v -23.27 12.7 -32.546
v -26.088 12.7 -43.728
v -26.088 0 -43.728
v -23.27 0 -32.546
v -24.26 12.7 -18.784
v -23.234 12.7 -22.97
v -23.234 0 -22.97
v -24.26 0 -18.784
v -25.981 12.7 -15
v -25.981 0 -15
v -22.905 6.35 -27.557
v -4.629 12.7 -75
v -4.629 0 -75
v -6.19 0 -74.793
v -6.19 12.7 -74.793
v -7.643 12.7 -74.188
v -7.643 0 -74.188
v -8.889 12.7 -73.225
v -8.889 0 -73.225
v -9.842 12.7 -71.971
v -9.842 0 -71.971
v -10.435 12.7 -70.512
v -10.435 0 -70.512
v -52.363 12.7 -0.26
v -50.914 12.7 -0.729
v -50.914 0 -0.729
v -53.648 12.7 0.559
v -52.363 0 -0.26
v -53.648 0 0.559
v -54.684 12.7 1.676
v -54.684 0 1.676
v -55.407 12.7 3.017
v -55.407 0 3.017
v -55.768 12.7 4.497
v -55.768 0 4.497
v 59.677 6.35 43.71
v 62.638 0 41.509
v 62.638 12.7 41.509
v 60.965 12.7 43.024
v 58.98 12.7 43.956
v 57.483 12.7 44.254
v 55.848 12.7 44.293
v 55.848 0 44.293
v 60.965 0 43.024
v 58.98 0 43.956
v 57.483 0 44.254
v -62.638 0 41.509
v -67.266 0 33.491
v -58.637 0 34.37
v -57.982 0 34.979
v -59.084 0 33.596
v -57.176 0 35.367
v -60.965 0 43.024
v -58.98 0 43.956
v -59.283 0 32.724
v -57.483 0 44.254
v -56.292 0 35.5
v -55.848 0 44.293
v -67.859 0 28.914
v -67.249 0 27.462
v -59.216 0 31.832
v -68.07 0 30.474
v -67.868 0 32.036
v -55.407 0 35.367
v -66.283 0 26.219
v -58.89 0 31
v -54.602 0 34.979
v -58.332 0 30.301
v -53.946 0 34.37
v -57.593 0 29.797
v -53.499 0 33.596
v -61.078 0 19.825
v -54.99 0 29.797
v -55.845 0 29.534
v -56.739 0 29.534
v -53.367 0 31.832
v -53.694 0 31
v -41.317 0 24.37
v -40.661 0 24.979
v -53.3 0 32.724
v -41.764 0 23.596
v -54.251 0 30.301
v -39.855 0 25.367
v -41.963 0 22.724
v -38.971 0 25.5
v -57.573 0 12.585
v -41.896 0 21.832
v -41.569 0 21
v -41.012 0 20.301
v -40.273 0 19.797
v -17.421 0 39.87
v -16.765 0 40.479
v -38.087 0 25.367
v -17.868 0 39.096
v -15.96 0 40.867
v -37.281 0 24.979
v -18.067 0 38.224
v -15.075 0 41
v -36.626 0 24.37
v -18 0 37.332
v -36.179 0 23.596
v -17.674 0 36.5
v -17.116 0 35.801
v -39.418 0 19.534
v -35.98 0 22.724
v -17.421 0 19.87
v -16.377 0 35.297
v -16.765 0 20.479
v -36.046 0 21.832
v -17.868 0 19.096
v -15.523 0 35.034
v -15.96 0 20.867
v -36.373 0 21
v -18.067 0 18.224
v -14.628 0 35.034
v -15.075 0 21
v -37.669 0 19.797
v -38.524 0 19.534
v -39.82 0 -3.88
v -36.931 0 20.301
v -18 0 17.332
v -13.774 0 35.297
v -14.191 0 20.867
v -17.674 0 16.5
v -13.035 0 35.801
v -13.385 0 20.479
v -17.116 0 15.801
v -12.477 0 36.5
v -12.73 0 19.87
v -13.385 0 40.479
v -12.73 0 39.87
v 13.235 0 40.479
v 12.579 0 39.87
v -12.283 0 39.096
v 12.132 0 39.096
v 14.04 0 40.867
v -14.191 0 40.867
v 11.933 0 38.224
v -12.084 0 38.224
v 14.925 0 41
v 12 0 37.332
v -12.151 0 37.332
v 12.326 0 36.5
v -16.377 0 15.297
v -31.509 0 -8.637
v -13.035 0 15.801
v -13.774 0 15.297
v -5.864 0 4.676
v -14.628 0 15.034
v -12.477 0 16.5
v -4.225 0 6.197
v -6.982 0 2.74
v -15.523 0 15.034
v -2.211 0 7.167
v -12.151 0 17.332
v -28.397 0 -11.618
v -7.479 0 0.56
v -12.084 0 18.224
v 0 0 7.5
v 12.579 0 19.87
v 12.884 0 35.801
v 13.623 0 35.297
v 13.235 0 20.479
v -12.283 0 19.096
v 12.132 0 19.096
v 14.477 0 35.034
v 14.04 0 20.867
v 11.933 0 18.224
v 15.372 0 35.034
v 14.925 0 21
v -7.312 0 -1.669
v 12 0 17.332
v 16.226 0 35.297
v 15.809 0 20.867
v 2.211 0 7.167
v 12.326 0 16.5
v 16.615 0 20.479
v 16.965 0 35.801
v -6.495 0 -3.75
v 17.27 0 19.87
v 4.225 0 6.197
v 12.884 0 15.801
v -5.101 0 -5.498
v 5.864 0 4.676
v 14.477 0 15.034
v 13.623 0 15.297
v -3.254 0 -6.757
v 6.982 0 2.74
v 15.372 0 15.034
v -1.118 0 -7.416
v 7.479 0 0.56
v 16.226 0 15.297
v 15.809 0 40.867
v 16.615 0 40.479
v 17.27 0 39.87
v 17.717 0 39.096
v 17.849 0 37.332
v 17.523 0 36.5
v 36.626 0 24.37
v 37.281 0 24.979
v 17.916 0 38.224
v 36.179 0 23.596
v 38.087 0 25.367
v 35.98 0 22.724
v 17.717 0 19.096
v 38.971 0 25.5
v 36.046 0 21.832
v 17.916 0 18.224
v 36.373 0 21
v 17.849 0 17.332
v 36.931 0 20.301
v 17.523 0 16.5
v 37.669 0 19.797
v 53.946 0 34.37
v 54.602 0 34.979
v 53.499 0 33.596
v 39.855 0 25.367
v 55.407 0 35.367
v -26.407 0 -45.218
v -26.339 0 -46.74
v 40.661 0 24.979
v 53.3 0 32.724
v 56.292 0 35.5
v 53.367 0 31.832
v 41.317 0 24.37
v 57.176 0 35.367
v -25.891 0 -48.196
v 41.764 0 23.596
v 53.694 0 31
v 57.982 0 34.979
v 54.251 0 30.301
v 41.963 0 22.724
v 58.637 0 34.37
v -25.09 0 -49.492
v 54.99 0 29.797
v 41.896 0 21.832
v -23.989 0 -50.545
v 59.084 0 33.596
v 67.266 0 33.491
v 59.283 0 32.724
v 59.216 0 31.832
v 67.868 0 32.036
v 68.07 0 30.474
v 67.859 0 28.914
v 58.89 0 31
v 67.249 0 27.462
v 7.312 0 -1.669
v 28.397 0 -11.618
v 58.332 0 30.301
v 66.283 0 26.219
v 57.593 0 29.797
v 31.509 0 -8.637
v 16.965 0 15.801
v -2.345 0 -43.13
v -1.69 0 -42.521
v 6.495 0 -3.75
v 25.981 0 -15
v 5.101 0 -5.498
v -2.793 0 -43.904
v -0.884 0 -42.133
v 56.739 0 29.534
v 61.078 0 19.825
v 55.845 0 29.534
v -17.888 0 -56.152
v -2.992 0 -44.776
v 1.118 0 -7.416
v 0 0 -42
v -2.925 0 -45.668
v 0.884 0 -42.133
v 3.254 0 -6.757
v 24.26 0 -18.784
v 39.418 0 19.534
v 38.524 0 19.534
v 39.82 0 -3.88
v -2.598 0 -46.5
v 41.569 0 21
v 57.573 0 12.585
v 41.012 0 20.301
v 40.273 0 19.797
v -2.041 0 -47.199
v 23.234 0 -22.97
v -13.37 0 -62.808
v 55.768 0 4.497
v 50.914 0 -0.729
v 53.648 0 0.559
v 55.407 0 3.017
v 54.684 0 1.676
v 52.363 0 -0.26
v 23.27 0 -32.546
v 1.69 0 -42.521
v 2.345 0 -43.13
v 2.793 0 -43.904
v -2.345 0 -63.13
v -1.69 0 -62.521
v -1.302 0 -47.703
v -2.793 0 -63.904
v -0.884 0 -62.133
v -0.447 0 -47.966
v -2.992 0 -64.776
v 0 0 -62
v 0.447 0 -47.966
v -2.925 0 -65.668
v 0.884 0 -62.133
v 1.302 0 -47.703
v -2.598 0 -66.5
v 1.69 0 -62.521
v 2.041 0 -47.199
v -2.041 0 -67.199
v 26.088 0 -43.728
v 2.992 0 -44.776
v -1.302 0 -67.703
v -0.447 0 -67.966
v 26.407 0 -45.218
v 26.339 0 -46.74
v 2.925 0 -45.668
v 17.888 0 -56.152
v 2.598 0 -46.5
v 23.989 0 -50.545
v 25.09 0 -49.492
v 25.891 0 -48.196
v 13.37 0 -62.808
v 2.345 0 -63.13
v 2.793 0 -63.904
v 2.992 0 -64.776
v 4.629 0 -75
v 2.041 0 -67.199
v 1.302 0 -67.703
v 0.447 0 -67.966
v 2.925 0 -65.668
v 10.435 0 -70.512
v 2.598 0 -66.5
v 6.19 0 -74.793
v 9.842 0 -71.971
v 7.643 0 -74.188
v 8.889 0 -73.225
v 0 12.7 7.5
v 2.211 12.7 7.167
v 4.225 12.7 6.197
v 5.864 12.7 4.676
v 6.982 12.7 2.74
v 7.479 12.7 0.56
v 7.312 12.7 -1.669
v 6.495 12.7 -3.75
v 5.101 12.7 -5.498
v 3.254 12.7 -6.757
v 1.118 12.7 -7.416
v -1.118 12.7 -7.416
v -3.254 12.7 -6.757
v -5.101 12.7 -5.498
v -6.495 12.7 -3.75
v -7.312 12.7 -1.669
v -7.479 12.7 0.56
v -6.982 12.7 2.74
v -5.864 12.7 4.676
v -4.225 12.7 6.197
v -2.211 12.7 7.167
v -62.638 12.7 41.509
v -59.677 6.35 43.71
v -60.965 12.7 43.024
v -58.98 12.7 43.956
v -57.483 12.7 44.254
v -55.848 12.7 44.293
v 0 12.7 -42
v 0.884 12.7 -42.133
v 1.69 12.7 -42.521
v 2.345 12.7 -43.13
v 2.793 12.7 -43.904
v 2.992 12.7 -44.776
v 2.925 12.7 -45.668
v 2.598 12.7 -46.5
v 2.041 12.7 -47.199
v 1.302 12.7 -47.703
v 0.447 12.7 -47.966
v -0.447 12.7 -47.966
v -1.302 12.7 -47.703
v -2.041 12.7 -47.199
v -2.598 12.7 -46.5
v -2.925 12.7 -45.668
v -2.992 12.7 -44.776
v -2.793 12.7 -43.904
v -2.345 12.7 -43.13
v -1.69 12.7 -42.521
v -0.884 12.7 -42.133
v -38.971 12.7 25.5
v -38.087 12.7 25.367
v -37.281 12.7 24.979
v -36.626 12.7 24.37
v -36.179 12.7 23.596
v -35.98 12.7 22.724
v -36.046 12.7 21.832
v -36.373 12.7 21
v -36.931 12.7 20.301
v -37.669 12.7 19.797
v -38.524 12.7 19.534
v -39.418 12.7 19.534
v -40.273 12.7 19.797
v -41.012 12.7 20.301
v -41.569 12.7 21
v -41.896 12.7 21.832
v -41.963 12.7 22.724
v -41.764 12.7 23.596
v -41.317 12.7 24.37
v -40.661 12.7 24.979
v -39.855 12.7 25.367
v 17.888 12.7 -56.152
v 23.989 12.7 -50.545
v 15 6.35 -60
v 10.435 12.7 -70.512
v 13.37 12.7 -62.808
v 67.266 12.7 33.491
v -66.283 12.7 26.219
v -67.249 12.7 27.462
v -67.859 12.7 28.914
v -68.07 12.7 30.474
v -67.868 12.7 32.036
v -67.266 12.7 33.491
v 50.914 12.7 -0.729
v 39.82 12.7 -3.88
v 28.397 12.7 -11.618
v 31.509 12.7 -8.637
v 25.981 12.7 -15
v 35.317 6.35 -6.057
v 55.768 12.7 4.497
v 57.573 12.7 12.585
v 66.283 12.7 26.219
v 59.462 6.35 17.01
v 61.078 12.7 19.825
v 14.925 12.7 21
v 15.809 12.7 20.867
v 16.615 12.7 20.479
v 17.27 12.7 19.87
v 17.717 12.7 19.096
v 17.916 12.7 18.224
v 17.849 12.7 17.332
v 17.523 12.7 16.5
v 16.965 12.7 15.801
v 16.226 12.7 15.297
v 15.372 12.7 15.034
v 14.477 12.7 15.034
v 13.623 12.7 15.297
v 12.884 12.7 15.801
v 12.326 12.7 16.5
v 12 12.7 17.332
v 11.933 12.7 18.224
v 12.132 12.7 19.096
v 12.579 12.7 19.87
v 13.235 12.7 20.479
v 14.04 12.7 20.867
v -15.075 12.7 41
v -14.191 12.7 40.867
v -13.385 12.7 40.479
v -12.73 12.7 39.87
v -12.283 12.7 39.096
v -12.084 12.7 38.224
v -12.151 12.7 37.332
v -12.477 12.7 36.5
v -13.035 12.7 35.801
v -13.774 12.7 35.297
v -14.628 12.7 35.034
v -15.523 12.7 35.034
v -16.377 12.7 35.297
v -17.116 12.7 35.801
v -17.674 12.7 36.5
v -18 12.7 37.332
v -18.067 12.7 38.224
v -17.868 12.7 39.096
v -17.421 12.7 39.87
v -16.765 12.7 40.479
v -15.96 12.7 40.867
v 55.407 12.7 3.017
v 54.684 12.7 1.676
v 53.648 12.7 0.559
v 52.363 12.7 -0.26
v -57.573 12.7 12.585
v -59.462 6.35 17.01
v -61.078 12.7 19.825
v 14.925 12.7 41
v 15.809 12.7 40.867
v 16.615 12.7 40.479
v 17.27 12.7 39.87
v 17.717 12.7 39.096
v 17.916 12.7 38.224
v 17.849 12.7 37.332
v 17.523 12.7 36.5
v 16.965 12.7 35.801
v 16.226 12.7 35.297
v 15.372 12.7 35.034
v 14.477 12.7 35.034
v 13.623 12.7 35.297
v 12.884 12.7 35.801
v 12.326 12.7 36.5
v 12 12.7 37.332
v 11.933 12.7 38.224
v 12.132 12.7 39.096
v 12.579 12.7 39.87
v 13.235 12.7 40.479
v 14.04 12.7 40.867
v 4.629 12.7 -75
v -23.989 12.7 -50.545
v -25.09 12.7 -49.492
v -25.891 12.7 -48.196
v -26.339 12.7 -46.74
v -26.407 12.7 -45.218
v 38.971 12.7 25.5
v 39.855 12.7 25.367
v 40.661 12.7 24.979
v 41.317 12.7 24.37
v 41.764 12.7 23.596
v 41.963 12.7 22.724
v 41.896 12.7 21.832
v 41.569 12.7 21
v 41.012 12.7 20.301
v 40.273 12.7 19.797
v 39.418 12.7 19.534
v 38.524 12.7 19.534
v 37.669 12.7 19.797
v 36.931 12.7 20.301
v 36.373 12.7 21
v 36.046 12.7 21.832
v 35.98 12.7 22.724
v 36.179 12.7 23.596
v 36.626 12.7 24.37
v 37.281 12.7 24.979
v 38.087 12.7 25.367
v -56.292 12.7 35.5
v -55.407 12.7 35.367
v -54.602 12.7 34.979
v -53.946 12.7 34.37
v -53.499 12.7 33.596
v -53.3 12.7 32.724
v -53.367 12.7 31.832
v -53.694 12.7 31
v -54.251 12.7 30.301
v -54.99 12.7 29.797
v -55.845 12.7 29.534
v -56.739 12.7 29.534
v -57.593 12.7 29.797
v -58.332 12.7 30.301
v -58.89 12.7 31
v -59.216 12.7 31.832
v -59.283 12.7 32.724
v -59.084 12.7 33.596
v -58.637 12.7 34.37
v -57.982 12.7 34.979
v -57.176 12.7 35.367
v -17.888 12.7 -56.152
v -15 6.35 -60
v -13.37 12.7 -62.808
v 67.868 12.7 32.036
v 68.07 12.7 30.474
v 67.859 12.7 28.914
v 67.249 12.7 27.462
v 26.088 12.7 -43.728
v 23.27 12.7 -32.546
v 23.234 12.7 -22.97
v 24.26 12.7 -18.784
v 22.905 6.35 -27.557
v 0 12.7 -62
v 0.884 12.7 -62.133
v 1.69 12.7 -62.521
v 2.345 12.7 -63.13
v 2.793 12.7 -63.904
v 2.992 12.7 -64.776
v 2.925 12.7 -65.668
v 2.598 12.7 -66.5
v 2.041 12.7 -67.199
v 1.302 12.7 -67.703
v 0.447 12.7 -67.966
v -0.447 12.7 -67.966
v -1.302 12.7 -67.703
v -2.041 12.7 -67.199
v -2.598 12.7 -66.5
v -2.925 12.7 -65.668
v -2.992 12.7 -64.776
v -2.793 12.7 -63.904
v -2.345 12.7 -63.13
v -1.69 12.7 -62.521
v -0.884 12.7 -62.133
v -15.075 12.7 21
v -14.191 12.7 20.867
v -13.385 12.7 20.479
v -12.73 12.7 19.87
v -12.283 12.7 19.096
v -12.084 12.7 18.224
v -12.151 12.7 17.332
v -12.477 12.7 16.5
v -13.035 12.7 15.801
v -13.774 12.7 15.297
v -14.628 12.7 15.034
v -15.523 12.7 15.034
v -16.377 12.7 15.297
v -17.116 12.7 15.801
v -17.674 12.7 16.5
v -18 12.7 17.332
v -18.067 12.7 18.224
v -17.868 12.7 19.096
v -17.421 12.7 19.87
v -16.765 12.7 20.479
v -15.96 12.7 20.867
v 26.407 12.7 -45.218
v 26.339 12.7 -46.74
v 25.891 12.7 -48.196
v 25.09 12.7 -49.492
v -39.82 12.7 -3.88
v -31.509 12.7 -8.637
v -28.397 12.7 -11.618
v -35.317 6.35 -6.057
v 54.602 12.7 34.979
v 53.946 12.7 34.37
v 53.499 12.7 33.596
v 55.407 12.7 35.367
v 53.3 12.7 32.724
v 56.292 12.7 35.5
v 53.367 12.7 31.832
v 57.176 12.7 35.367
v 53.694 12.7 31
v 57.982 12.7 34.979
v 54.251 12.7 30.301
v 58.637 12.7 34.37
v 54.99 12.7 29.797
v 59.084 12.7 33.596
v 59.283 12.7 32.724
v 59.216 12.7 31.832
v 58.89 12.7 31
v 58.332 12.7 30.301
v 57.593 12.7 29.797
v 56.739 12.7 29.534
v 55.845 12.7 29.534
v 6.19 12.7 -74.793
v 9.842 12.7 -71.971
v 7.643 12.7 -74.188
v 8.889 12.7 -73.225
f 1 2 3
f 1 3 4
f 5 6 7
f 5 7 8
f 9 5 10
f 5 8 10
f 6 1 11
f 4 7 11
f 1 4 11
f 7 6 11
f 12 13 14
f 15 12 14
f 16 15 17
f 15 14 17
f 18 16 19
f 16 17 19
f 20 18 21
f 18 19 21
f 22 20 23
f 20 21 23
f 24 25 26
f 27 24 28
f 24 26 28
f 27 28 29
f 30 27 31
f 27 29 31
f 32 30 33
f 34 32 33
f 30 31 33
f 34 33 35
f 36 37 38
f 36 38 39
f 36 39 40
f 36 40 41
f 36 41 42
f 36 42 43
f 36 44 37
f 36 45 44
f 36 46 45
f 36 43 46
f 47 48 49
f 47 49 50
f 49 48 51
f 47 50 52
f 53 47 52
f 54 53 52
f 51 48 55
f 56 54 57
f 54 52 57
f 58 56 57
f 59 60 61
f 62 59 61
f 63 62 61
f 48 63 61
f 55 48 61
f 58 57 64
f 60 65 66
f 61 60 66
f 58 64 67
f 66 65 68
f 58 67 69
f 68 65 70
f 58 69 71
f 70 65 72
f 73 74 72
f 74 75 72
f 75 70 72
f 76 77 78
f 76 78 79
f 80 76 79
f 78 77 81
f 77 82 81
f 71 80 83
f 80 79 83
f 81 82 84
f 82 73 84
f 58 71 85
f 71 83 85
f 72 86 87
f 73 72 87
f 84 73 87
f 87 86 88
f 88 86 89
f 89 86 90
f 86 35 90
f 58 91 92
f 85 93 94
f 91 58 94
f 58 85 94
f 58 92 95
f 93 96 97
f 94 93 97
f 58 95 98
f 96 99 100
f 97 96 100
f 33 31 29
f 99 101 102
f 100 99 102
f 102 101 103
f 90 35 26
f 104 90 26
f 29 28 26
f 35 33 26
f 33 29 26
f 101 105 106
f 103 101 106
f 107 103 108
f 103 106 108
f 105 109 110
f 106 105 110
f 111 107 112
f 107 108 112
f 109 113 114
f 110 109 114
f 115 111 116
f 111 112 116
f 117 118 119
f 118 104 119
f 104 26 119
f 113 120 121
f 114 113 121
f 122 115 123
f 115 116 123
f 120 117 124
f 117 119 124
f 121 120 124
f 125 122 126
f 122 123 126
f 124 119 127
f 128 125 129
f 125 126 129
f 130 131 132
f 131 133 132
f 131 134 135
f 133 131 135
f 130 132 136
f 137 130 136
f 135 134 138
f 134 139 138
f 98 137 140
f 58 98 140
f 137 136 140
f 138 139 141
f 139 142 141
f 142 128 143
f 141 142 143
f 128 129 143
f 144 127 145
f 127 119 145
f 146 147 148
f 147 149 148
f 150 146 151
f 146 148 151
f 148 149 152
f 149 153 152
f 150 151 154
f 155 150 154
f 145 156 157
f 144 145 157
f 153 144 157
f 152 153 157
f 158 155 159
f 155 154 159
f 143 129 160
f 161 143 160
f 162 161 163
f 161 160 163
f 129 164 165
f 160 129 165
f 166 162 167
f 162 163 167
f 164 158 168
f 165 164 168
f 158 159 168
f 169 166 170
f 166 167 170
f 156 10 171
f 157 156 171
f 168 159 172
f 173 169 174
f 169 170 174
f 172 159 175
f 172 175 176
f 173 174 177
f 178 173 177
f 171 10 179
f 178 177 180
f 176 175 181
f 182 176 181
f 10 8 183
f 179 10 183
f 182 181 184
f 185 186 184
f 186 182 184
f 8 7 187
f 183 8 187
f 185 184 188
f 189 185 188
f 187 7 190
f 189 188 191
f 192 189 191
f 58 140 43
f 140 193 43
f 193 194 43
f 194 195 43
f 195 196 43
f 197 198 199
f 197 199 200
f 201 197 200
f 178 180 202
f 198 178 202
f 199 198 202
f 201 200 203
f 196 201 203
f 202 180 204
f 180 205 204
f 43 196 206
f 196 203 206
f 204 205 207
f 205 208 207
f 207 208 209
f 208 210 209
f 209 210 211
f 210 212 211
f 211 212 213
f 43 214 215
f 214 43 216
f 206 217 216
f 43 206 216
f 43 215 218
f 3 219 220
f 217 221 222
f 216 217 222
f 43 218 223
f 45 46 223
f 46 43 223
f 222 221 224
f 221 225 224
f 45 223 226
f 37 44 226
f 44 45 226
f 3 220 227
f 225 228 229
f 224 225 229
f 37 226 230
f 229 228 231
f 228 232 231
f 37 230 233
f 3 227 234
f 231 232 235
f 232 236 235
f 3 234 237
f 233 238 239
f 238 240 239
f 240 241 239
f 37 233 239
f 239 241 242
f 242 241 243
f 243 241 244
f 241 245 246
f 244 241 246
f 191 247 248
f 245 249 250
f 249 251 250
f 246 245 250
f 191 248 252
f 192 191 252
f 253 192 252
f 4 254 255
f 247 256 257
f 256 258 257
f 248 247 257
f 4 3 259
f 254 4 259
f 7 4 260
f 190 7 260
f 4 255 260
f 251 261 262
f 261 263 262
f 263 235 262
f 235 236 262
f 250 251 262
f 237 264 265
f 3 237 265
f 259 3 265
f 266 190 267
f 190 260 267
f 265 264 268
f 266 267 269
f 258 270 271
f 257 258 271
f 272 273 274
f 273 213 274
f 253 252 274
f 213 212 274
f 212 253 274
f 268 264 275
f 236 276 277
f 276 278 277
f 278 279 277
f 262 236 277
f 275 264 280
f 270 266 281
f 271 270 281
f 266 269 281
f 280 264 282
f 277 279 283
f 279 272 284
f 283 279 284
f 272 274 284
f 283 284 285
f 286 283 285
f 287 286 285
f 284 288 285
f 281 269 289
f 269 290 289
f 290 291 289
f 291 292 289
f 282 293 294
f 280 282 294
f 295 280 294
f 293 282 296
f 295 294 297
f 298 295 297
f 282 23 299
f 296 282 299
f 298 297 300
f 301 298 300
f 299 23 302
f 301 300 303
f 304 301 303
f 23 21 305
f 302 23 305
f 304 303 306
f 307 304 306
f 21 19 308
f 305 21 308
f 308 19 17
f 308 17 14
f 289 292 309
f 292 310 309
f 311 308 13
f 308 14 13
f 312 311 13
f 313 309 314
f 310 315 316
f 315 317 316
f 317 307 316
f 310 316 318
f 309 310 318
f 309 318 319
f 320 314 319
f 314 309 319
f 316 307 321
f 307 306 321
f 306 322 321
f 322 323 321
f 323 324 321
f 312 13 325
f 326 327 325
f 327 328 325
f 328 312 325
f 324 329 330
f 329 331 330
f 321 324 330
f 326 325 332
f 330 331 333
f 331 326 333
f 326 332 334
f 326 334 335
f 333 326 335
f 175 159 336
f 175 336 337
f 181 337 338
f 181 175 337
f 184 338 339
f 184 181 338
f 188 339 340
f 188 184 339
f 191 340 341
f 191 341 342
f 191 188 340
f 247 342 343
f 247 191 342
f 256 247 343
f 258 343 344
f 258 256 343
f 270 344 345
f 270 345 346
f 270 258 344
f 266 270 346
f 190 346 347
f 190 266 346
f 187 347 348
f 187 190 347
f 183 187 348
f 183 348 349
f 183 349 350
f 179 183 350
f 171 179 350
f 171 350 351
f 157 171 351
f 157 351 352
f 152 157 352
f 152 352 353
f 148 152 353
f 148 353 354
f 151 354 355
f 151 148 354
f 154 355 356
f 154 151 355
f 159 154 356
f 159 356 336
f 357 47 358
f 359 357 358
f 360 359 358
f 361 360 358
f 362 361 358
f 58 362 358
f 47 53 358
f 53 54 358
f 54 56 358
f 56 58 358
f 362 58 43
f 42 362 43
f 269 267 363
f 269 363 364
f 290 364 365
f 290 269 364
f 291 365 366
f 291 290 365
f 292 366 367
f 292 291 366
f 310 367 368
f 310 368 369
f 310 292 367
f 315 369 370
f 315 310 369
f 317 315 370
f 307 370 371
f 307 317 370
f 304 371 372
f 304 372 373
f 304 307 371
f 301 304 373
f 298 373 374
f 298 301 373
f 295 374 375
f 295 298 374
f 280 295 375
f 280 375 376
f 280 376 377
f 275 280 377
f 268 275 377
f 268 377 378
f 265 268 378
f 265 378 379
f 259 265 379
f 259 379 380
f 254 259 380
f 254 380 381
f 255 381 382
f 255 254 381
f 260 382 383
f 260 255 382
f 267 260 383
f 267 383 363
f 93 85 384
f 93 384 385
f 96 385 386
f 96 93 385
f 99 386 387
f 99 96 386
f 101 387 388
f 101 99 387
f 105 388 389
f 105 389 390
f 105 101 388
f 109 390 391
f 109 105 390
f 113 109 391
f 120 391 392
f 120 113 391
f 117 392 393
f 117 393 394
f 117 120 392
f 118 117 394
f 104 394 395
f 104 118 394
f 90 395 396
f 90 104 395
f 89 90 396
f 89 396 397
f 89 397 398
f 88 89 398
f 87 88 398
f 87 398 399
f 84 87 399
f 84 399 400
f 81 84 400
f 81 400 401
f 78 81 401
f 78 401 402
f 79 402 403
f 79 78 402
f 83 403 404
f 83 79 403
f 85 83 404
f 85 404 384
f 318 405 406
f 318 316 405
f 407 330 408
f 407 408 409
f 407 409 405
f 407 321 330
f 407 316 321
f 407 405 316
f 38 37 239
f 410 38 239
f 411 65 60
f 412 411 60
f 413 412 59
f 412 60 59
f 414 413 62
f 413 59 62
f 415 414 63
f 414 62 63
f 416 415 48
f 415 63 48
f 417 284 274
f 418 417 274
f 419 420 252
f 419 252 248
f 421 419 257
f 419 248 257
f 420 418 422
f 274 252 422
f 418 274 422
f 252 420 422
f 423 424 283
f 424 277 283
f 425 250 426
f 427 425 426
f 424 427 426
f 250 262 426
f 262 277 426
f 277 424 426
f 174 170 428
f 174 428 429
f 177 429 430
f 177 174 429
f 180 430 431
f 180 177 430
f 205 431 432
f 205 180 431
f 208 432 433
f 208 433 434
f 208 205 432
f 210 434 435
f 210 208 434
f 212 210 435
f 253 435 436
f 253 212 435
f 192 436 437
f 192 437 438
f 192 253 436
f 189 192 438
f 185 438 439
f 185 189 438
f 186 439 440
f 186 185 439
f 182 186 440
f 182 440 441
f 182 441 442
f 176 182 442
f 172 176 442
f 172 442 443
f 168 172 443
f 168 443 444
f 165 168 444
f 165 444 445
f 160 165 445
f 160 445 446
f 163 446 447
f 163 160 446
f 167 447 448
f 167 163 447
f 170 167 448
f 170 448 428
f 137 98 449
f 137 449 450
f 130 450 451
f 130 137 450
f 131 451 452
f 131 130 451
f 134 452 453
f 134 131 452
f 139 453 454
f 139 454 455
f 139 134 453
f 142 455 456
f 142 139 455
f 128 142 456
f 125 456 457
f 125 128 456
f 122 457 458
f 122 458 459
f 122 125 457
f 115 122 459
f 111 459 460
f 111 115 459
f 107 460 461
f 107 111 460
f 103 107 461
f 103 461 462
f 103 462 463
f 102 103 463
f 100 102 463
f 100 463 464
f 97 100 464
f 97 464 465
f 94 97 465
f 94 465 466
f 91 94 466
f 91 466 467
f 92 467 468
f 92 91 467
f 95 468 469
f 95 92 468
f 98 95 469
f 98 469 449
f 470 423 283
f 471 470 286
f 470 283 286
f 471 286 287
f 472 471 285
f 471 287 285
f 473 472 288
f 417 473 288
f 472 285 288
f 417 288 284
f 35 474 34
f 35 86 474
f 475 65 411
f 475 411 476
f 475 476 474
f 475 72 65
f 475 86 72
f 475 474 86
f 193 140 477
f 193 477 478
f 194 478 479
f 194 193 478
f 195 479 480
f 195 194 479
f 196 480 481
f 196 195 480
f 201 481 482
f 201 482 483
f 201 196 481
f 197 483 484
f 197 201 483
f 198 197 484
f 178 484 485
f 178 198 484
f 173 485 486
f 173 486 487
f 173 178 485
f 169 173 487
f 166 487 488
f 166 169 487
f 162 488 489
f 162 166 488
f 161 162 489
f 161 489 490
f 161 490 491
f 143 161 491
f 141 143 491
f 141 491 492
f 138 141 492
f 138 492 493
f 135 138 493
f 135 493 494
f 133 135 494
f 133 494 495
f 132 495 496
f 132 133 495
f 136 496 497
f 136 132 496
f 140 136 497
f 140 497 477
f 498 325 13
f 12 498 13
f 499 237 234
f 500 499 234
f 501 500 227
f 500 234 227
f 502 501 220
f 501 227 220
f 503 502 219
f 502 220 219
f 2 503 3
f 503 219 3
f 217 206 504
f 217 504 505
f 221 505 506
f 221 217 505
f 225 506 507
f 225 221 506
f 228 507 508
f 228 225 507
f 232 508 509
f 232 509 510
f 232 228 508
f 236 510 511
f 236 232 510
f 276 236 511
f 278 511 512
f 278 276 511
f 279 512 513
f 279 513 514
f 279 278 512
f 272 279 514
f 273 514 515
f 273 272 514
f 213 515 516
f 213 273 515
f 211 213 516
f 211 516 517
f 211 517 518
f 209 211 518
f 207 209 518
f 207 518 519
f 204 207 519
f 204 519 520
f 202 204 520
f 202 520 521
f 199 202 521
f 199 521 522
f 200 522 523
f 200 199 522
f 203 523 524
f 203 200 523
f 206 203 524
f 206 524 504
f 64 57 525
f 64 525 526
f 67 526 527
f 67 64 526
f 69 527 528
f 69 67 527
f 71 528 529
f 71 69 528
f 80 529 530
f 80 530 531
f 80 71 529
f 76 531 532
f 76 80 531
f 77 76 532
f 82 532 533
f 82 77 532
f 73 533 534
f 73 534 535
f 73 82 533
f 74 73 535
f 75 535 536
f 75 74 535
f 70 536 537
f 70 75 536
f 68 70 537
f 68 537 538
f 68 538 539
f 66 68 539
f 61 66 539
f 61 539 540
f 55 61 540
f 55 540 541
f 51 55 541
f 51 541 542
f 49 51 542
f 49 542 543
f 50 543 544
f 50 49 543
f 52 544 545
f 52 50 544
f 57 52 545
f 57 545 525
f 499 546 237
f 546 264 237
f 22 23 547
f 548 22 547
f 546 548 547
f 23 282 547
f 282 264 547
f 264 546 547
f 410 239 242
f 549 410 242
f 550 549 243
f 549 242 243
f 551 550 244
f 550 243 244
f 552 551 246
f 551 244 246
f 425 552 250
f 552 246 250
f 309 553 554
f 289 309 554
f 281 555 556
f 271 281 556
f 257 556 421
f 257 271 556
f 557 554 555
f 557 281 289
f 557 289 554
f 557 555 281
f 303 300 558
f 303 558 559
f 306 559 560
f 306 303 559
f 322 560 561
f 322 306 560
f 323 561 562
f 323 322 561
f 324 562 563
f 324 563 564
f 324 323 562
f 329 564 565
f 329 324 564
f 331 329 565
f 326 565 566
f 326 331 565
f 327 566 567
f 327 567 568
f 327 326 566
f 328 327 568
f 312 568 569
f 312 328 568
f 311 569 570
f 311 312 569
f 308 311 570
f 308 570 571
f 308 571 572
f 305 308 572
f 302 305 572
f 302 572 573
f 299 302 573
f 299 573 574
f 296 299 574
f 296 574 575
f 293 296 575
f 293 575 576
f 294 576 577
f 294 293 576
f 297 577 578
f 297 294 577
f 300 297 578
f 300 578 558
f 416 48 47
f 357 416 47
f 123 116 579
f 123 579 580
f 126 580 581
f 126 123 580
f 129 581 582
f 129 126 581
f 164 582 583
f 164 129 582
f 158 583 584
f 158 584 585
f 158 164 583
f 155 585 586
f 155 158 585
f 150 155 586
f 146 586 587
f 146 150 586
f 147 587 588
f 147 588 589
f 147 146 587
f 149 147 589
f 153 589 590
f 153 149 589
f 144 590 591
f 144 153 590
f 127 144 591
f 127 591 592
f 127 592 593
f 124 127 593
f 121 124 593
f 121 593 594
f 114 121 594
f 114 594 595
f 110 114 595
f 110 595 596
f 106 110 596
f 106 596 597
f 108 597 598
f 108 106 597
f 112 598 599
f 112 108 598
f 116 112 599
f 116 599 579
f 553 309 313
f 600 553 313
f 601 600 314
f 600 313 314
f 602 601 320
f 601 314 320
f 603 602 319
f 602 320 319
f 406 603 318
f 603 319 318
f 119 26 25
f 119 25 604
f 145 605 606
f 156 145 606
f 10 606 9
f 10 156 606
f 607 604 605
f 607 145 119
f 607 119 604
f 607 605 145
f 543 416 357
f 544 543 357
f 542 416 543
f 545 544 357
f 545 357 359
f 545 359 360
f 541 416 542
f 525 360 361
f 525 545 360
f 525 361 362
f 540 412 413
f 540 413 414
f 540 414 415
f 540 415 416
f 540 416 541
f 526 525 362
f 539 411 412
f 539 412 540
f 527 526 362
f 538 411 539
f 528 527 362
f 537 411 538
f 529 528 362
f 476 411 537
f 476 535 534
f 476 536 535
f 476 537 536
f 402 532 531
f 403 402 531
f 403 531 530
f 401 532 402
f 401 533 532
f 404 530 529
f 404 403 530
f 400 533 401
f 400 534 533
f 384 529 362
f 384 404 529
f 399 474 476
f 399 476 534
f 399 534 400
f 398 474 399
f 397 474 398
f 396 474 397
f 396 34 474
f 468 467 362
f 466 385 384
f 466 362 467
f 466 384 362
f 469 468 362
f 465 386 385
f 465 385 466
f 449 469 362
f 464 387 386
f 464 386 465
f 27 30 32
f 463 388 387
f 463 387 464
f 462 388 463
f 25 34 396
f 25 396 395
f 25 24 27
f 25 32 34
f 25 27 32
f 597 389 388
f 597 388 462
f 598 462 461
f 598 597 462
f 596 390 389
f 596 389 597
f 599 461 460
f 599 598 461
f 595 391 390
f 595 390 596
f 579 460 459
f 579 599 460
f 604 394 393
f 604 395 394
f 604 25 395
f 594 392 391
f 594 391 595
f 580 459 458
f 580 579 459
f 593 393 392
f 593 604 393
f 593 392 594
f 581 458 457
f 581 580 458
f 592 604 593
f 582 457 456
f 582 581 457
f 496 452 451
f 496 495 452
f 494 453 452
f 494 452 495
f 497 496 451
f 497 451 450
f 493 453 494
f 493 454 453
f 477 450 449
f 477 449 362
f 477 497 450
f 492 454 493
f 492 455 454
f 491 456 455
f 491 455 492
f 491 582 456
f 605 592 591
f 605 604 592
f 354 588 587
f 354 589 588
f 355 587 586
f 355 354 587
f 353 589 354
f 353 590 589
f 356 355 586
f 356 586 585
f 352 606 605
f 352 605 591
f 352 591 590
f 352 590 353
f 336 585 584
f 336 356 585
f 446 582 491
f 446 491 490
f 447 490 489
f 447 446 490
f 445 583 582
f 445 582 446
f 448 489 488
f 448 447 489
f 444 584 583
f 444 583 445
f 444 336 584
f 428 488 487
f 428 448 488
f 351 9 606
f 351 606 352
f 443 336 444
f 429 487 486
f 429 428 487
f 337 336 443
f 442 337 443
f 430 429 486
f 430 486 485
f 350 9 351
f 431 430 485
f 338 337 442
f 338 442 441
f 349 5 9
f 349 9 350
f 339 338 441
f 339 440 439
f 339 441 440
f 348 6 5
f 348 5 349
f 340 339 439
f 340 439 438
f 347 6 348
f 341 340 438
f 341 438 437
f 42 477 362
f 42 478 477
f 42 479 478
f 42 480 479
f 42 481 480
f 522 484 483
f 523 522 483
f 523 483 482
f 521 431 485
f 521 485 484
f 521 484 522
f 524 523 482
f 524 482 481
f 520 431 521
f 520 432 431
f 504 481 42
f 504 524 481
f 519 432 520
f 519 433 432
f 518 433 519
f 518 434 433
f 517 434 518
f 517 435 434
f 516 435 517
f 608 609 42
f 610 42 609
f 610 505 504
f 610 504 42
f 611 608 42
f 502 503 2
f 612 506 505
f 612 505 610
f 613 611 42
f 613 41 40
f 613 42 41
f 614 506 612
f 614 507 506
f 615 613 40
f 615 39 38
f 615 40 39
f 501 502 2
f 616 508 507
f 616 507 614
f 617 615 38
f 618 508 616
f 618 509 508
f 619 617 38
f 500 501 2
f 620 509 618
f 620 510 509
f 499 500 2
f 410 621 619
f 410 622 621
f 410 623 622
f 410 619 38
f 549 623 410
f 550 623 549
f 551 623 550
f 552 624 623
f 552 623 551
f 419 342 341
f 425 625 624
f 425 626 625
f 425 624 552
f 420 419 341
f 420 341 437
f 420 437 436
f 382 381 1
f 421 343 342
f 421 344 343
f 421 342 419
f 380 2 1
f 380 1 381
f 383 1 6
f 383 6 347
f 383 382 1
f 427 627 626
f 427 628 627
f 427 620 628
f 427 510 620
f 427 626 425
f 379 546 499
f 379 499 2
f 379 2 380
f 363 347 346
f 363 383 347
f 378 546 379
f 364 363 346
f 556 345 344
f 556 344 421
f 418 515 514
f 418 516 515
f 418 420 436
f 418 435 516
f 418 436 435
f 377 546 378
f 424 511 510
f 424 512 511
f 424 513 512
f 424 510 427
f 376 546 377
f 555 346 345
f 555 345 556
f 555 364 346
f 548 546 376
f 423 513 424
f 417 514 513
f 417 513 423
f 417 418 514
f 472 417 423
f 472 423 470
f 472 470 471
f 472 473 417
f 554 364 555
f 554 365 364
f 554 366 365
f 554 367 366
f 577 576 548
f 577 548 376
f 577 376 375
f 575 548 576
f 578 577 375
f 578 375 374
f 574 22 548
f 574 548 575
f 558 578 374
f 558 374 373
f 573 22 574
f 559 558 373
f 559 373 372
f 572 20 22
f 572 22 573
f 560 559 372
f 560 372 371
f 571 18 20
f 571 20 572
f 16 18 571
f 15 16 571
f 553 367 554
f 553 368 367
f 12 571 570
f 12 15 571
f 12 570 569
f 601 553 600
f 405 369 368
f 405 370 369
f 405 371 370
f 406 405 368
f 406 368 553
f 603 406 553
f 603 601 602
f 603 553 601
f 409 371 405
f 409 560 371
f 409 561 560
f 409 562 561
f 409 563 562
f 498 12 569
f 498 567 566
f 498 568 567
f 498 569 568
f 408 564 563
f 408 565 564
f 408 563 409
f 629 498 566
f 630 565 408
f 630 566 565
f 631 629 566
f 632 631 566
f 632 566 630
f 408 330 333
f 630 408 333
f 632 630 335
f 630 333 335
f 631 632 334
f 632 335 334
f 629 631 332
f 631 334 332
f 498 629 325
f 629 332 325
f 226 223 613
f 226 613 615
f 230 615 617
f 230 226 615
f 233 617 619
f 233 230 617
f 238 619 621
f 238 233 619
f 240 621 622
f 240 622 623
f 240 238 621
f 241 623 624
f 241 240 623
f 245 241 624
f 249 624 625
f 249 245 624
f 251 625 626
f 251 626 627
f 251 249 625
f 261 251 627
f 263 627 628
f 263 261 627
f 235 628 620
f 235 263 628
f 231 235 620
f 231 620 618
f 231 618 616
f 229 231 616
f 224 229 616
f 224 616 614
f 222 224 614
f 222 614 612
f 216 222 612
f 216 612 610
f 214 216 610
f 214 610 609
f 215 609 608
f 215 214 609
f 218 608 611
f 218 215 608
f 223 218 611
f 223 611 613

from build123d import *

# Parameters (mm, degrees)
SKETCH1_R           = 7.5
SKETCH1_R_2         = 3
BOSS_EXTRUDE1_DEPTH = 12.7


with BuildPart() as part:
    # Sketch1 → Boss-Extrude1 (new body)
    with BuildSketch(Plane(origin=(0, 0, 0), x_dir=(1, 0, 0), z_dir=(0, 1, 0))):
        with BuildLine():
            Line((4.628728323, 75), (-4.628728323, 75))
            ThreePointArc((-4.628728323, 75), (-8.298056729, 73.747212766), (-10.435089207, 70.512009682))
            add(Edge.make_bspline(
                [(-10.435089207, 70.512009682), (-11.436889623, 66.664934619), (-14.691827535, 59.170334198), (-20.319154818, 53.251718644), (-23.989109736, 50.544662785)],
                knots=[0.130554933, 0.130554933, 0.130554933, 0.130554933, 0.477565762, 0.872598063, 0.872598063, 0.872598063, 0.872598063], degree=3))
            ThreePointArc((-23.989109736, 50.544662785), (-26.161679176, 47.482134252), (-26.088483789, 43.727965713))
            add(Edge.make_bspline(
                [(-26.088483789, 43.727965713), (-23.983802584, 37.735198712), (-21.861167747, 26.954437426), (-23.911988058, 18.58322157), (-25.980762, 15)],
                knots=[0.052697527, 0.052697527, 0.052697527, 0.052697527, 0.276348764, 0.5, 0.5, 0.5, 0.5], degree=3))
            add(Edge.make_bspline(
                [(-50.913771074, 0.729306865), (-44.671541988, 1.902983), (-34.273811388, 5.455107991), (-28.049535938, 11.416778424), (-25.980762, 15)],
                knots=[0.052697527, 0.052697527, 0.052697527, 0.052697527, 0.276348763, 0.5, 0.5, 0.5, 0.5], degree=3))
            ThreePointArc((-50.913771074, 0.729306865), (-54.201574082, -1.084388344), (-55.767516863, -4.497152931))
            add(Edge.make_bspline(
                [(-66.282736261, -26.218952497), (-63.451971733, -23.427830356), (-58.58892633, -16.861671221), (-56.276918547, -9.028955057), (-55.767516863, -4.497152931)],
                knots=[0.130554933, 0.130554933, 0.130554933, 0.130554933, 0.477565762, 0.872598064, 0.872598064, 0.872598064, 0.872598064], degree=3))
            ThreePointArc((-66.282736261, -26.218952497), (-68.015988078, -29.687278454), (-67.266269445, -33.491403685))
            Line((-67.266269445, -33.491403685), (-62.637541122, -41.508596315))
            add(Edge.make_bspline(
                [(-62.637541122, -41.508596315), (-60.110445807, -44.518882553), (-55.847647053, -44.293057185)],
                knots=[0, 0, 0, 1, 1, 1], degree=2))
            Line((-55.847647053, -44.293057185), (55.847647053, -44.293057185))
            add(Edge.make_bspline(
                [(62.637541122, -41.508596315), (60.110445807, -44.518882553), (55.847647053, -44.293057185)],
                knots=[0, 0, 0, 1, 1, 1], degree=2))
            Line((62.637541122, -41.508596315), (67.266269445, -33.491403685))
            ThreePointArc((67.266269445, -33.491403685), (68.015988078, -29.687278454), (66.282736261, -26.218952497))
            add(Edge.make_bspline(
                [(66.282736261, -26.218952497), (63.451971733, -23.427830356), (58.58892633, -16.861671221), (56.276918547, -9.028955057), (55.767516863, -4.497152931)],
                knots=[0.130554933, 0.130554933, 0.130554933, 0.130554933, 0.477565762, 0.872598064, 0.872598064, 0.872598064, 0.872598064], degree=3))
            ThreePointArc((55.767516863, -4.497152931), (54.201574082, -1.084388344), (50.913771074, 0.729306865))
            add(Edge.make_bspline(
                [(50.913771074, 0.729306865), (44.671541988, 1.902983), (34.273811388, 5.455107991), (28.049535938, 11.416778424), (25.980762, 15)],
                knots=[0.052697527, 0.052697527, 0.052697527, 0.052697527, 0.276348763, 0.5, 0.5, 0.5, 0.5], degree=3))
            add(Edge.make_bspline(
                [(26.088483789, 43.727965713), (23.983802584, 37.735198712), (21.861167747, 26.954437426), (23.911988058, 18.58322157), (25.980762, 15)],
                knots=[0.052697527, 0.052697527, 0.052697527, 0.052697527, 0.276348764, 0.5, 0.5, 0.5, 0.5], degree=3))
            ThreePointArc((26.088483789, 43.727965713), (26.161679176, 47.482134252), (23.989109736, 50.544662785))
            add(Edge.make_bspline(
                [(10.435089207, 70.512009682), (11.436889623, 66.664934619), (14.691827535, 59.170334198), (20.319154818, 53.251718644), (23.989109736, 50.544662785)],
                knots=[0.130554933, 0.130554933, 0.130554933, 0.130554933, 0.477565762, 0.872598063, 0.872598063, 0.872598063, 0.872598063], degree=3))
            ThreePointArc((10.435089207, 70.512009682), (8.298056729, 73.747212766), (4.628728323, 75))
        make_face()
        with Locations(Location((0, 0, 0), (0, 0, 270))):
            Circle(SKETCH1_R, mode=Mode.SUBTRACT)
        with Locations(Location((0, 65, 0), (0, 0, 270))):
            Circle(SKETCH1_R_2, mode=Mode.SUBTRACT)
        with Locations(Location((0, 45, 0), (0, 0, 270))):
            Circle(SKETCH1_R_2, mode=Mode.SUBTRACT)
        with Locations(Location((56.291651246, -32.5, 0), (0, 0, 270))):
            Circle(SKETCH1_R_2, mode=Mode.SUBTRACT)
        with Locations(Location((38.97114317, -22.5, 0), (0, 0, 270))):
            Circle(SKETCH1_R_2, mode=Mode.SUBTRACT)
        with Locations(Location((-56.291651246, -32.5, 0), (0, 0, 270))):
            Circle(SKETCH1_R_2, mode=Mode.SUBTRACT)
        with Locations(Location((-38.97114317, -22.5, 0), (0, 0, 270))):
            Circle(SKETCH1_R_2, mode=Mode.SUBTRACT)
        with Locations(Location((-15.075454508, -18, 0), (0, 0, 270))):
            Circle(SKETCH1_R_2, mode=Mode.SUBTRACT)
        with Locations(Location((-15.075454508, -38, 0), (0, 0, 270))):
            Circle(SKETCH1_R_2, mode=Mode.SUBTRACT)
        with Locations(Location((14.924545492, -38, 0), (0, 0, 270))):
            Circle(SKETCH1_R_2, mode=Mode.SUBTRACT)
        with Locations(Location((14.924545492, -18, 0), (0, 0, 270))):
            Circle(SKETCH1_R_2, mode=Mode.SUBTRACT)
    extrude(amount=BOSS_EXTRUDE1_DEPTH)


solid = part.part
